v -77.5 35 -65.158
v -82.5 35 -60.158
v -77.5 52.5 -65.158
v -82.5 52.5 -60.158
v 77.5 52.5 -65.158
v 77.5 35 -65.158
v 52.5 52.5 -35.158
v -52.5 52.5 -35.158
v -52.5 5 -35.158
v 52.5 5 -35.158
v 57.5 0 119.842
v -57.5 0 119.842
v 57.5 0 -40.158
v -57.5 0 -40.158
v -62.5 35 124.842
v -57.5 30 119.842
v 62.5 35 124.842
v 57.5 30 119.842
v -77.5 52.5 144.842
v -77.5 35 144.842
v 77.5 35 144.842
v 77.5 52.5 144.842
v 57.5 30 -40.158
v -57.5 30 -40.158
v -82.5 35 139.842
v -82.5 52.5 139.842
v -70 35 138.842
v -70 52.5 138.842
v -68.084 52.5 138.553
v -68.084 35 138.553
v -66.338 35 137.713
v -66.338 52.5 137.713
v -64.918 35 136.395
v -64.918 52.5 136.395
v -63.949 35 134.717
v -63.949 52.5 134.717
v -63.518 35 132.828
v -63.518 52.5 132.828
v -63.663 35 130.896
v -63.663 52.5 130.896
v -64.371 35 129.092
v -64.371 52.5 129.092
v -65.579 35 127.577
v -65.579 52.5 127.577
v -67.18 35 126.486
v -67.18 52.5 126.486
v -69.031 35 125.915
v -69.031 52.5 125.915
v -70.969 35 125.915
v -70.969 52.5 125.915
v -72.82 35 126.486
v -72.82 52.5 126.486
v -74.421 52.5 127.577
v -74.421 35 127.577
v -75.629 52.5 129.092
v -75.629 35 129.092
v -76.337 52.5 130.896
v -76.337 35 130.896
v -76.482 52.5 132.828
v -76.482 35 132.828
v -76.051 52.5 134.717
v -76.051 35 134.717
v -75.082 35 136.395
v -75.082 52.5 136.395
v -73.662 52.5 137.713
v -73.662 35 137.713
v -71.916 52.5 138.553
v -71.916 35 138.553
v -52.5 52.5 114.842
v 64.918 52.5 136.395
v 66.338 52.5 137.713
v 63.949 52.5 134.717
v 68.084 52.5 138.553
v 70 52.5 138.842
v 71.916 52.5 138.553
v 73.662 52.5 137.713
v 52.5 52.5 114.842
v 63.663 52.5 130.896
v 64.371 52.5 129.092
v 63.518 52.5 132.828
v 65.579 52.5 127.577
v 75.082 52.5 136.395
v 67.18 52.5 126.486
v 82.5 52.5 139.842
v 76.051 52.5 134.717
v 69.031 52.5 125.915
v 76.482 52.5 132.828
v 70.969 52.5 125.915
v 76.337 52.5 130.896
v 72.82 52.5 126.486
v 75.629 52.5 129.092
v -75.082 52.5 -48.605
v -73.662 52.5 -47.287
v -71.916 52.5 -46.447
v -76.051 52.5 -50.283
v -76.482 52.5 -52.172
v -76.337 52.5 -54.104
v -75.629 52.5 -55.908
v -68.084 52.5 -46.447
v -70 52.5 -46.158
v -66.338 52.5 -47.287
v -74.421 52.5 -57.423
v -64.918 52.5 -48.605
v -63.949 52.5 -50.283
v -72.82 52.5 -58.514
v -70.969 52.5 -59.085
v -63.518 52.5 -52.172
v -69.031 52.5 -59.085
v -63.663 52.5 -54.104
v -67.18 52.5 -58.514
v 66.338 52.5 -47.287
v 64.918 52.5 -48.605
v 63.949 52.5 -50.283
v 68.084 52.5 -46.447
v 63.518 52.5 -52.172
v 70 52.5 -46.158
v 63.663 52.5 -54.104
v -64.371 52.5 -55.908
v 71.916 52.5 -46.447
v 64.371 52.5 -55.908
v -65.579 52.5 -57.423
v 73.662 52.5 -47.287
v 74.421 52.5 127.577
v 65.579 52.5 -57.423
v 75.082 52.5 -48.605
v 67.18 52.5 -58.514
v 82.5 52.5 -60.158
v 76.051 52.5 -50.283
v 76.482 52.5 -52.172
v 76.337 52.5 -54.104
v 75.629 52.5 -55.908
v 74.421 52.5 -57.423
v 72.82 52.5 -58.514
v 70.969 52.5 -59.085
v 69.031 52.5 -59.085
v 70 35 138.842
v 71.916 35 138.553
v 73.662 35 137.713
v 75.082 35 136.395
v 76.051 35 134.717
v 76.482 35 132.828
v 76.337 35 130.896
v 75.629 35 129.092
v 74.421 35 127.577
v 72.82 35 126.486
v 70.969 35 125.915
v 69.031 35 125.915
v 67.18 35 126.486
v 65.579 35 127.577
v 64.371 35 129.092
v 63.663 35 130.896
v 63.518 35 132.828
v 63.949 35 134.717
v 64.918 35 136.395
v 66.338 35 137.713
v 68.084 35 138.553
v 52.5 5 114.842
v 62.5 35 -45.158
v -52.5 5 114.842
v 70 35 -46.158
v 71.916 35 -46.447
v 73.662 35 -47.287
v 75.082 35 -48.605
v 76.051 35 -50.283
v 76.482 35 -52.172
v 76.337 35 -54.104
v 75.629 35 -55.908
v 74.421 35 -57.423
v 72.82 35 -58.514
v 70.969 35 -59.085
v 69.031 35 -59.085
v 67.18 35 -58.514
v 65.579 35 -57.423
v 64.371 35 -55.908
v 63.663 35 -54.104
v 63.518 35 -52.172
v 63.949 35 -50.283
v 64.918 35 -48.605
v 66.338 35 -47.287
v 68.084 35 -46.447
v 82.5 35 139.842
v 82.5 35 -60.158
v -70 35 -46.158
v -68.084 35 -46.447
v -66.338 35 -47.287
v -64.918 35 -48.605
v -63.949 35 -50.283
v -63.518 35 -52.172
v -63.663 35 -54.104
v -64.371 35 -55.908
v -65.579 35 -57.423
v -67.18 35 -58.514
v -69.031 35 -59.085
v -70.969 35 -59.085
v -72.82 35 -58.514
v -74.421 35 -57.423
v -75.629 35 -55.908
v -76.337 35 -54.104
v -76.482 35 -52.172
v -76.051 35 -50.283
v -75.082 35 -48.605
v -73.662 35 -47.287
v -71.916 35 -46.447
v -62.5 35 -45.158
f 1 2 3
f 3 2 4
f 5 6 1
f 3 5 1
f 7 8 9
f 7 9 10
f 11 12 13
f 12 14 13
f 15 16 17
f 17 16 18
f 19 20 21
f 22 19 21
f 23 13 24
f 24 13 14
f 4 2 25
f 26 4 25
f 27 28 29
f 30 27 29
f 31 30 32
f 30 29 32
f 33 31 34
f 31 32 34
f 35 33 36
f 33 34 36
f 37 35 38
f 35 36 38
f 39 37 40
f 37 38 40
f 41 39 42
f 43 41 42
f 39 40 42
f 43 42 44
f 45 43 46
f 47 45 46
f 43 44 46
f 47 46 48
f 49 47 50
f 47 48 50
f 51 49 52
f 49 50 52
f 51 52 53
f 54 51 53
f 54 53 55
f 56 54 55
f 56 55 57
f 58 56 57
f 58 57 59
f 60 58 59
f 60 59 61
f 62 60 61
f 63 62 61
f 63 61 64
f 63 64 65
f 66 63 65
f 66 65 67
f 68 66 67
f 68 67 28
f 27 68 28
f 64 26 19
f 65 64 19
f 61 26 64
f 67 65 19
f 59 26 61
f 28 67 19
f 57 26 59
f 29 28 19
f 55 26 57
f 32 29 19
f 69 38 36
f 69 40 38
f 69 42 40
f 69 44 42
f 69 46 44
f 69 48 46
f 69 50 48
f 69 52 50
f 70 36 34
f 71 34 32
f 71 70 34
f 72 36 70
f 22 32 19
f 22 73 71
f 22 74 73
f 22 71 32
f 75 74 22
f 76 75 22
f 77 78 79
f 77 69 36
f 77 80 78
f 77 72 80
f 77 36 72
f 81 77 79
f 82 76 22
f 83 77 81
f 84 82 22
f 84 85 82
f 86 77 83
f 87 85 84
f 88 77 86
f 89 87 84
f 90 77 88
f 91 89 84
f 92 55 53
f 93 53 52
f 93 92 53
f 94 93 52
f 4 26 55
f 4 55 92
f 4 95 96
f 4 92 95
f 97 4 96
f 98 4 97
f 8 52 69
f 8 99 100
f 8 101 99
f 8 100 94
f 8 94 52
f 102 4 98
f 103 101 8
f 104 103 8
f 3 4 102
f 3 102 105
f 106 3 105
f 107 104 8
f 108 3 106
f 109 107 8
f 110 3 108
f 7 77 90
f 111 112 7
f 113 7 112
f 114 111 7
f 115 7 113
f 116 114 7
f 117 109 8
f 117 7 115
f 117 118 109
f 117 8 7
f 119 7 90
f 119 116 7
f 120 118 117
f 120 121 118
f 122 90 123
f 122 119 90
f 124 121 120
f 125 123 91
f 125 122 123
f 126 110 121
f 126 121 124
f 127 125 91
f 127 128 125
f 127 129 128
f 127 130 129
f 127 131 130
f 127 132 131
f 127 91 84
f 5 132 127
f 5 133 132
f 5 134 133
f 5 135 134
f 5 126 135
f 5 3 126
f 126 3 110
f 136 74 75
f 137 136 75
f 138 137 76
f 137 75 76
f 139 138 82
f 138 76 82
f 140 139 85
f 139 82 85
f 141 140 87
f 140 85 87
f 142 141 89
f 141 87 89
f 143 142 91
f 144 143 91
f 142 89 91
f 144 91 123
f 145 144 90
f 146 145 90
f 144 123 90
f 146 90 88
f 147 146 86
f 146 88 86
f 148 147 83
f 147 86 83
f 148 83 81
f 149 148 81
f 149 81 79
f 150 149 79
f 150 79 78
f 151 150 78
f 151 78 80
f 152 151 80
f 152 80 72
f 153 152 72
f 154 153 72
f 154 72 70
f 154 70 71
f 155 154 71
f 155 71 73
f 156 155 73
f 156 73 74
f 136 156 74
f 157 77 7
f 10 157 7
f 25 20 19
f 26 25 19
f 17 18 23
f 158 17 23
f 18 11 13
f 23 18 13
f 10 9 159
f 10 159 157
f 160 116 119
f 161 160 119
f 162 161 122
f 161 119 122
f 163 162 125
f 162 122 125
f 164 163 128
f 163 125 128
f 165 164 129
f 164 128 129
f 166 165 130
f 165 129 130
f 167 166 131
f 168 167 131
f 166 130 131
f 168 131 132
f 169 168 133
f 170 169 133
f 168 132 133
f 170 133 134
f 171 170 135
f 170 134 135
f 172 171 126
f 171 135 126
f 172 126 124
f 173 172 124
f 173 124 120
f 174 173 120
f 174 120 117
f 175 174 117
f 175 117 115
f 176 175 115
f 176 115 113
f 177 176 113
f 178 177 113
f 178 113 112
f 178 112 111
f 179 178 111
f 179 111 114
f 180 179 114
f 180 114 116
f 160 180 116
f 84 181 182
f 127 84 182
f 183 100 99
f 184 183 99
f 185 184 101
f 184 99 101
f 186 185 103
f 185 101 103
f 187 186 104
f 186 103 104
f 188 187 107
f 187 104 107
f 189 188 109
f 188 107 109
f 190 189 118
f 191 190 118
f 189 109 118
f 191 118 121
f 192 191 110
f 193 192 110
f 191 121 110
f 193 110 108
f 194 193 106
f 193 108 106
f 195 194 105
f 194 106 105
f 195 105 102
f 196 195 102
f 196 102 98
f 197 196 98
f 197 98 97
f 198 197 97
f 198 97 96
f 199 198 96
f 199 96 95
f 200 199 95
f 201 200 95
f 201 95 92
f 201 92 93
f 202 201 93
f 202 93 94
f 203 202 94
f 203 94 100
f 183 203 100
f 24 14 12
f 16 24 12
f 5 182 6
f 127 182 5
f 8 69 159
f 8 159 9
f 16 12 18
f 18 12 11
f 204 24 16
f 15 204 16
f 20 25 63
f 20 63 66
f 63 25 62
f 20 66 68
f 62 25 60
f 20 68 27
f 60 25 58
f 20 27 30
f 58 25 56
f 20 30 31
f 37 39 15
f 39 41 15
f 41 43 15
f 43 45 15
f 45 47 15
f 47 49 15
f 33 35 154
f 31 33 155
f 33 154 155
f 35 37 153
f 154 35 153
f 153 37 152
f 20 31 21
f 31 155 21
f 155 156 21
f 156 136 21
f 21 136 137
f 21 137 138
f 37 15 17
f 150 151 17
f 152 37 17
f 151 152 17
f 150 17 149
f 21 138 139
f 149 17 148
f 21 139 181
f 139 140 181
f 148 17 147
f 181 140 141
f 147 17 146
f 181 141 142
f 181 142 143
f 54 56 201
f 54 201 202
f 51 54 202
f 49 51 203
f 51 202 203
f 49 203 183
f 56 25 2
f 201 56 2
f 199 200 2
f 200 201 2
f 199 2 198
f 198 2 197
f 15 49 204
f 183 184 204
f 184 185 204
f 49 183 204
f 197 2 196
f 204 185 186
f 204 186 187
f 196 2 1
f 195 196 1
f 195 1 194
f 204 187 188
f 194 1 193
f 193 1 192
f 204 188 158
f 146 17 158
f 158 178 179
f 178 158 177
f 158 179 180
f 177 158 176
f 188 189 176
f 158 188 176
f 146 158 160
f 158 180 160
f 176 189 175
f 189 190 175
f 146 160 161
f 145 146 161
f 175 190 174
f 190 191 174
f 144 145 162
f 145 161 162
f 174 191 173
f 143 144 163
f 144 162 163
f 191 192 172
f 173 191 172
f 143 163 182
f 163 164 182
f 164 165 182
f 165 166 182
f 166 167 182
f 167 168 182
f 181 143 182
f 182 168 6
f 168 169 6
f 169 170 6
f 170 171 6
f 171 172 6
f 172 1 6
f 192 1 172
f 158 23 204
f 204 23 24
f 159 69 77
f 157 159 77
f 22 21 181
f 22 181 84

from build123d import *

# Parameters (mm, degrees)
SKETCH1_W           = 105
SKETCH1_H           = 150
SKETCH1_W_2         = 5
SKETCH1_H_2         = 5
BOSS_EXTRUDE1_DEPTH = 35
SKETCH2_W           = 5
SKETCH2_H           = 5
SKETCH2_W_2         = 105
SKETCH2_H_2         = 150
BOSS_EXTRUDE2_DEPTH = 17.5
SKETCH3_W           = 105
SKETCH3_H           = 150
CUT_EXTRUDE1_DEPTH  = 47.5
CUT_EXTRUDE2_REACH  = 176.762
SKETCH4_R           = 6.5
CHAMFER1_SIZE       = 5
CHAMFER2_SIZE       = 5


with BuildPart() as part:
    # Sketch1 → Boss-Extrude1 (new body)
    with BuildSketch(Plane(origin=(0, 0, 0), x_dir=(1, 0, 0), z_dir=(0, 1, 0))):
        Polygon((52.5, -114.8421646), (-52.5, -114.8421646), (-52.5, 35.1578354), (-57.5, 35.1578354), (-57.5, -119.8421646), (52.5, -119.8421646), align=None)
        with Locations((0, -39.8421646)):
            Rectangle(SKETCH1_W, SKETCH1_H)
        Polygon((52.5, 35.1578354), (52.5, -114.8421646), (57.5, -114.8421646), (57.5, 40.1578354), (-52.5, 40.1578354), (-52.5, 35.1578354), align=None)
        with Locations((55, -117.3421646)):
            Rectangle(SKETCH1_W_2, SKETCH1_H_2)
        with Locations((-55, 37.6578354)):
            Rectangle(SKETCH1_W_2, SKETCH1_H_2)
    extrude(amount=BOSS_EXTRUDE1_DEPTH)

    # Sketch2 → Boss-Extrude2 (add)
    with BuildSketch(Plane(origin=(0, 35, 0), x_dir=(1, 0, 0), z_dir=(0, 1, 0))):
        Polygon((-77.5, -139.8421646), (-77.5, 35.1578354), (-77.5, 60.1578354), (-82.5, 60.1578354), (-82.5, -144.8421646), (77.5, -144.8421646), (77.5, -139.8421646), (52.5, -139.8421646), align=None)
        Polygon((-77.5, 60.1578354), (-52.5, 60.1578354), (77.5, 60.1578354), (77.5, -114.8421646), (77.5, -139.8421646), (82.5, -139.8421646), (82.5, 65.1578354), (-77.5, 65.1578354), align=None)
        with Locations((-80, 62.6578354)):
            Rectangle(SKETCH2_W, SKETCH2_H)
        Polygon((-77.5, 35.1578354), (-57.5, 35.1578354), (-57.5, 40.1578354), (-52.5, 40.1578354), (-52.5, 60.1578354), (-77.5, 60.1578354), align=None)
        Polygon((-52.5, 60.1578354), (-52.5, 40.1578354), (57.5, 40.1578354), (57.5, -114.8421646), (77.5, -114.8421646), (77.5, 60.1578354), align=None)
        Polygon((-52.5, 40.1578354), (-52.5, 35.1578354), (52.5, 35.1578354), (52.5, -114.8421646), (57.5, -114.8421646), (57.5, 40.1578354), align=None)
        with Locations((-55, 37.6578354)):
            Rectangle(SKETCH2_W, SKETCH2_H)
        Polygon((-52.5, -114.8421646), (-52.5, 35.1578354), (-57.5, 35.1578354), (-57.5, -119.8421646), (52.5, -119.8421646), (52.5, -114.8421646), align=None)
        Polygon((-57.5, -119.8421646), (-57.5, 35.1578354), (-77.5, 35.1578354), (-77.5, -139.8421646), (52.5, -139.8421646), (52.5, -119.8421646), align=None)
        with Locations((0, -39.8421646)):
            Rectangle(SKETCH2_W_2, SKETCH2_H_2)
        with Locations((55, -117.3421646)):
            Rectangle(SKETCH2_W, SKETCH2_H)
        Polygon((77.5, -114.8421646), (57.5, -114.8421646), (57.5, -119.8421646), (52.5, -119.8421646), (52.5, -139.8421646), (77.5, -139.8421646), align=None)
        with Locations((80, -142.3421646)):
            Rectangle(SKETCH2_W, SKETCH2_H)
    extrude(amount=BOSS_EXTRUDE2_DEPTH)

    # Sketch3 → Cut-Extrude1 (cut)
    with BuildSketch(Plane(origin=(0, 52.5, 0), x_dir=(1, 0, 0), z_dir=(0, 1, 0))):
        with Locations((0, -39.8421646)):
            Rectangle(SKETCH3_W, SKETCH3_H)
    extrude(amount=-CUT_EXTRUDE1_DEPTH, mode=Mode.SUBTRACT)

    # Sketch4 → Cut-Extrude2 (cut, up to next)
    with BuildSketch(Plane(origin=(0, 52.5, 0), x_dir=(1, 0, 0), z_dir=(0, 1, 0)), mode=Mode.PRIVATE) as cut_extrude2_sk1:
        with Locations(Location((-70, 52.6578354, 0), (0, 0, 270))):
            Circle(SKETCH4_R)
    cut_extrude2_tool1 = extrude(cut_extrude2_sk1.sketch, amount=-CUT_EXTRUDE2_REACH, mode=Mode.PRIVATE) & part.part
    # Sketch4 → Cut-Extrude2 (cut, up to next)
    with BuildSketch(Plane(origin=(0, 52.5, 0), x_dir=(1, 0, 0), z_dir=(0, 1, 0)), mode=Mode.PRIVATE) as cut_extrude2_sk2:
        with Locations(Location((-70, -132.3421646, 0), (0, 0, 270))):
            Circle(SKETCH4_R)
    cut_extrude2_tool2 = extrude(cut_extrude2_sk2.sketch, amount=-CUT_EXTRUDE2_REACH, mode=Mode.PRIVATE) & part.part
    # Sketch4 → Cut-Extrude2 (cut, up to next)
    with BuildSketch(Plane(origin=(0, 52.5, 0), x_dir=(1, 0, 0), z_dir=(0, 1, 0)), mode=Mode.PRIVATE) as cut_extrude2_sk3:
        with Locations(Location((70, -132.3421646, 0), (0, 0, 270))):
            Circle(SKETCH4_R)
    cut_extrude2_tool3 = extrude(cut_extrude2_sk3.sketch, amount=-CUT_EXTRUDE2_REACH, mode=Mode.PRIVATE) & part.part
    # Sketch4 → Cut-Extrude2 (cut, up to next)
    with BuildSketch(Plane(origin=(0, 52.5, 0), x_dir=(1, 0, 0), z_dir=(0, 1, 0)), mode=Mode.PRIVATE) as cut_extrude2_sk4:
        with Locations(Location((70, 52.6578354, 0), (0, 0, 270))):
            Circle(SKETCH4_R)
    cut_extrude2_tool4 = extrude(cut_extrude2_sk4.sketch, amount=-CUT_EXTRUDE2_REACH, mode=Mode.PRIVATE) & part.part
    add(cut_extrude2_tool1.solids().sort_by_distance((-70, 52.5, -52.657835))[0], mode=Mode.SUBTRACT)
    add(cut_extrude2_tool2.solids().sort_by_distance((-70, 52.5, 132.342165))[0], mode=Mode.SUBTRACT)
    add(cut_extrude2_tool3.solids().sort_by_distance((70, 52.5, 132.342165))[0], mode=Mode.SUBTRACT)
    add(cut_extrude2_tool4.solids().sort_by_distance((70, 52.5, -52.657835))[0], mode=Mode.SUBTRACT)

    # Chamfer1
    chamfer1_edges = [part.edges().sort_by_distance(p)[0] for p in [
        (0, 35, -40.1578354),
        (-57.5, 35, 39.8421646),
        (0, 35, 119.8421646),
        (57.5, 35, 39.8421646),
    ]]
    chamfer(chamfer1_edges, length=CHAMFER1_SIZE)

    # Chamfer2
    chamfer2_edges = [part.edges().sort_by_distance(p)[0] for p in [
        (82.5, 43.75, 144.8421646),
        (82.5, 43.75, -65.1578354),
        (-82.5, 43.75, -65.1578354),
        (-82.5, 43.75, 144.8421646),
    ]]
    chamfer(chamfer2_edges, length=CHAMFER2_SIZE)


solid = part.part
